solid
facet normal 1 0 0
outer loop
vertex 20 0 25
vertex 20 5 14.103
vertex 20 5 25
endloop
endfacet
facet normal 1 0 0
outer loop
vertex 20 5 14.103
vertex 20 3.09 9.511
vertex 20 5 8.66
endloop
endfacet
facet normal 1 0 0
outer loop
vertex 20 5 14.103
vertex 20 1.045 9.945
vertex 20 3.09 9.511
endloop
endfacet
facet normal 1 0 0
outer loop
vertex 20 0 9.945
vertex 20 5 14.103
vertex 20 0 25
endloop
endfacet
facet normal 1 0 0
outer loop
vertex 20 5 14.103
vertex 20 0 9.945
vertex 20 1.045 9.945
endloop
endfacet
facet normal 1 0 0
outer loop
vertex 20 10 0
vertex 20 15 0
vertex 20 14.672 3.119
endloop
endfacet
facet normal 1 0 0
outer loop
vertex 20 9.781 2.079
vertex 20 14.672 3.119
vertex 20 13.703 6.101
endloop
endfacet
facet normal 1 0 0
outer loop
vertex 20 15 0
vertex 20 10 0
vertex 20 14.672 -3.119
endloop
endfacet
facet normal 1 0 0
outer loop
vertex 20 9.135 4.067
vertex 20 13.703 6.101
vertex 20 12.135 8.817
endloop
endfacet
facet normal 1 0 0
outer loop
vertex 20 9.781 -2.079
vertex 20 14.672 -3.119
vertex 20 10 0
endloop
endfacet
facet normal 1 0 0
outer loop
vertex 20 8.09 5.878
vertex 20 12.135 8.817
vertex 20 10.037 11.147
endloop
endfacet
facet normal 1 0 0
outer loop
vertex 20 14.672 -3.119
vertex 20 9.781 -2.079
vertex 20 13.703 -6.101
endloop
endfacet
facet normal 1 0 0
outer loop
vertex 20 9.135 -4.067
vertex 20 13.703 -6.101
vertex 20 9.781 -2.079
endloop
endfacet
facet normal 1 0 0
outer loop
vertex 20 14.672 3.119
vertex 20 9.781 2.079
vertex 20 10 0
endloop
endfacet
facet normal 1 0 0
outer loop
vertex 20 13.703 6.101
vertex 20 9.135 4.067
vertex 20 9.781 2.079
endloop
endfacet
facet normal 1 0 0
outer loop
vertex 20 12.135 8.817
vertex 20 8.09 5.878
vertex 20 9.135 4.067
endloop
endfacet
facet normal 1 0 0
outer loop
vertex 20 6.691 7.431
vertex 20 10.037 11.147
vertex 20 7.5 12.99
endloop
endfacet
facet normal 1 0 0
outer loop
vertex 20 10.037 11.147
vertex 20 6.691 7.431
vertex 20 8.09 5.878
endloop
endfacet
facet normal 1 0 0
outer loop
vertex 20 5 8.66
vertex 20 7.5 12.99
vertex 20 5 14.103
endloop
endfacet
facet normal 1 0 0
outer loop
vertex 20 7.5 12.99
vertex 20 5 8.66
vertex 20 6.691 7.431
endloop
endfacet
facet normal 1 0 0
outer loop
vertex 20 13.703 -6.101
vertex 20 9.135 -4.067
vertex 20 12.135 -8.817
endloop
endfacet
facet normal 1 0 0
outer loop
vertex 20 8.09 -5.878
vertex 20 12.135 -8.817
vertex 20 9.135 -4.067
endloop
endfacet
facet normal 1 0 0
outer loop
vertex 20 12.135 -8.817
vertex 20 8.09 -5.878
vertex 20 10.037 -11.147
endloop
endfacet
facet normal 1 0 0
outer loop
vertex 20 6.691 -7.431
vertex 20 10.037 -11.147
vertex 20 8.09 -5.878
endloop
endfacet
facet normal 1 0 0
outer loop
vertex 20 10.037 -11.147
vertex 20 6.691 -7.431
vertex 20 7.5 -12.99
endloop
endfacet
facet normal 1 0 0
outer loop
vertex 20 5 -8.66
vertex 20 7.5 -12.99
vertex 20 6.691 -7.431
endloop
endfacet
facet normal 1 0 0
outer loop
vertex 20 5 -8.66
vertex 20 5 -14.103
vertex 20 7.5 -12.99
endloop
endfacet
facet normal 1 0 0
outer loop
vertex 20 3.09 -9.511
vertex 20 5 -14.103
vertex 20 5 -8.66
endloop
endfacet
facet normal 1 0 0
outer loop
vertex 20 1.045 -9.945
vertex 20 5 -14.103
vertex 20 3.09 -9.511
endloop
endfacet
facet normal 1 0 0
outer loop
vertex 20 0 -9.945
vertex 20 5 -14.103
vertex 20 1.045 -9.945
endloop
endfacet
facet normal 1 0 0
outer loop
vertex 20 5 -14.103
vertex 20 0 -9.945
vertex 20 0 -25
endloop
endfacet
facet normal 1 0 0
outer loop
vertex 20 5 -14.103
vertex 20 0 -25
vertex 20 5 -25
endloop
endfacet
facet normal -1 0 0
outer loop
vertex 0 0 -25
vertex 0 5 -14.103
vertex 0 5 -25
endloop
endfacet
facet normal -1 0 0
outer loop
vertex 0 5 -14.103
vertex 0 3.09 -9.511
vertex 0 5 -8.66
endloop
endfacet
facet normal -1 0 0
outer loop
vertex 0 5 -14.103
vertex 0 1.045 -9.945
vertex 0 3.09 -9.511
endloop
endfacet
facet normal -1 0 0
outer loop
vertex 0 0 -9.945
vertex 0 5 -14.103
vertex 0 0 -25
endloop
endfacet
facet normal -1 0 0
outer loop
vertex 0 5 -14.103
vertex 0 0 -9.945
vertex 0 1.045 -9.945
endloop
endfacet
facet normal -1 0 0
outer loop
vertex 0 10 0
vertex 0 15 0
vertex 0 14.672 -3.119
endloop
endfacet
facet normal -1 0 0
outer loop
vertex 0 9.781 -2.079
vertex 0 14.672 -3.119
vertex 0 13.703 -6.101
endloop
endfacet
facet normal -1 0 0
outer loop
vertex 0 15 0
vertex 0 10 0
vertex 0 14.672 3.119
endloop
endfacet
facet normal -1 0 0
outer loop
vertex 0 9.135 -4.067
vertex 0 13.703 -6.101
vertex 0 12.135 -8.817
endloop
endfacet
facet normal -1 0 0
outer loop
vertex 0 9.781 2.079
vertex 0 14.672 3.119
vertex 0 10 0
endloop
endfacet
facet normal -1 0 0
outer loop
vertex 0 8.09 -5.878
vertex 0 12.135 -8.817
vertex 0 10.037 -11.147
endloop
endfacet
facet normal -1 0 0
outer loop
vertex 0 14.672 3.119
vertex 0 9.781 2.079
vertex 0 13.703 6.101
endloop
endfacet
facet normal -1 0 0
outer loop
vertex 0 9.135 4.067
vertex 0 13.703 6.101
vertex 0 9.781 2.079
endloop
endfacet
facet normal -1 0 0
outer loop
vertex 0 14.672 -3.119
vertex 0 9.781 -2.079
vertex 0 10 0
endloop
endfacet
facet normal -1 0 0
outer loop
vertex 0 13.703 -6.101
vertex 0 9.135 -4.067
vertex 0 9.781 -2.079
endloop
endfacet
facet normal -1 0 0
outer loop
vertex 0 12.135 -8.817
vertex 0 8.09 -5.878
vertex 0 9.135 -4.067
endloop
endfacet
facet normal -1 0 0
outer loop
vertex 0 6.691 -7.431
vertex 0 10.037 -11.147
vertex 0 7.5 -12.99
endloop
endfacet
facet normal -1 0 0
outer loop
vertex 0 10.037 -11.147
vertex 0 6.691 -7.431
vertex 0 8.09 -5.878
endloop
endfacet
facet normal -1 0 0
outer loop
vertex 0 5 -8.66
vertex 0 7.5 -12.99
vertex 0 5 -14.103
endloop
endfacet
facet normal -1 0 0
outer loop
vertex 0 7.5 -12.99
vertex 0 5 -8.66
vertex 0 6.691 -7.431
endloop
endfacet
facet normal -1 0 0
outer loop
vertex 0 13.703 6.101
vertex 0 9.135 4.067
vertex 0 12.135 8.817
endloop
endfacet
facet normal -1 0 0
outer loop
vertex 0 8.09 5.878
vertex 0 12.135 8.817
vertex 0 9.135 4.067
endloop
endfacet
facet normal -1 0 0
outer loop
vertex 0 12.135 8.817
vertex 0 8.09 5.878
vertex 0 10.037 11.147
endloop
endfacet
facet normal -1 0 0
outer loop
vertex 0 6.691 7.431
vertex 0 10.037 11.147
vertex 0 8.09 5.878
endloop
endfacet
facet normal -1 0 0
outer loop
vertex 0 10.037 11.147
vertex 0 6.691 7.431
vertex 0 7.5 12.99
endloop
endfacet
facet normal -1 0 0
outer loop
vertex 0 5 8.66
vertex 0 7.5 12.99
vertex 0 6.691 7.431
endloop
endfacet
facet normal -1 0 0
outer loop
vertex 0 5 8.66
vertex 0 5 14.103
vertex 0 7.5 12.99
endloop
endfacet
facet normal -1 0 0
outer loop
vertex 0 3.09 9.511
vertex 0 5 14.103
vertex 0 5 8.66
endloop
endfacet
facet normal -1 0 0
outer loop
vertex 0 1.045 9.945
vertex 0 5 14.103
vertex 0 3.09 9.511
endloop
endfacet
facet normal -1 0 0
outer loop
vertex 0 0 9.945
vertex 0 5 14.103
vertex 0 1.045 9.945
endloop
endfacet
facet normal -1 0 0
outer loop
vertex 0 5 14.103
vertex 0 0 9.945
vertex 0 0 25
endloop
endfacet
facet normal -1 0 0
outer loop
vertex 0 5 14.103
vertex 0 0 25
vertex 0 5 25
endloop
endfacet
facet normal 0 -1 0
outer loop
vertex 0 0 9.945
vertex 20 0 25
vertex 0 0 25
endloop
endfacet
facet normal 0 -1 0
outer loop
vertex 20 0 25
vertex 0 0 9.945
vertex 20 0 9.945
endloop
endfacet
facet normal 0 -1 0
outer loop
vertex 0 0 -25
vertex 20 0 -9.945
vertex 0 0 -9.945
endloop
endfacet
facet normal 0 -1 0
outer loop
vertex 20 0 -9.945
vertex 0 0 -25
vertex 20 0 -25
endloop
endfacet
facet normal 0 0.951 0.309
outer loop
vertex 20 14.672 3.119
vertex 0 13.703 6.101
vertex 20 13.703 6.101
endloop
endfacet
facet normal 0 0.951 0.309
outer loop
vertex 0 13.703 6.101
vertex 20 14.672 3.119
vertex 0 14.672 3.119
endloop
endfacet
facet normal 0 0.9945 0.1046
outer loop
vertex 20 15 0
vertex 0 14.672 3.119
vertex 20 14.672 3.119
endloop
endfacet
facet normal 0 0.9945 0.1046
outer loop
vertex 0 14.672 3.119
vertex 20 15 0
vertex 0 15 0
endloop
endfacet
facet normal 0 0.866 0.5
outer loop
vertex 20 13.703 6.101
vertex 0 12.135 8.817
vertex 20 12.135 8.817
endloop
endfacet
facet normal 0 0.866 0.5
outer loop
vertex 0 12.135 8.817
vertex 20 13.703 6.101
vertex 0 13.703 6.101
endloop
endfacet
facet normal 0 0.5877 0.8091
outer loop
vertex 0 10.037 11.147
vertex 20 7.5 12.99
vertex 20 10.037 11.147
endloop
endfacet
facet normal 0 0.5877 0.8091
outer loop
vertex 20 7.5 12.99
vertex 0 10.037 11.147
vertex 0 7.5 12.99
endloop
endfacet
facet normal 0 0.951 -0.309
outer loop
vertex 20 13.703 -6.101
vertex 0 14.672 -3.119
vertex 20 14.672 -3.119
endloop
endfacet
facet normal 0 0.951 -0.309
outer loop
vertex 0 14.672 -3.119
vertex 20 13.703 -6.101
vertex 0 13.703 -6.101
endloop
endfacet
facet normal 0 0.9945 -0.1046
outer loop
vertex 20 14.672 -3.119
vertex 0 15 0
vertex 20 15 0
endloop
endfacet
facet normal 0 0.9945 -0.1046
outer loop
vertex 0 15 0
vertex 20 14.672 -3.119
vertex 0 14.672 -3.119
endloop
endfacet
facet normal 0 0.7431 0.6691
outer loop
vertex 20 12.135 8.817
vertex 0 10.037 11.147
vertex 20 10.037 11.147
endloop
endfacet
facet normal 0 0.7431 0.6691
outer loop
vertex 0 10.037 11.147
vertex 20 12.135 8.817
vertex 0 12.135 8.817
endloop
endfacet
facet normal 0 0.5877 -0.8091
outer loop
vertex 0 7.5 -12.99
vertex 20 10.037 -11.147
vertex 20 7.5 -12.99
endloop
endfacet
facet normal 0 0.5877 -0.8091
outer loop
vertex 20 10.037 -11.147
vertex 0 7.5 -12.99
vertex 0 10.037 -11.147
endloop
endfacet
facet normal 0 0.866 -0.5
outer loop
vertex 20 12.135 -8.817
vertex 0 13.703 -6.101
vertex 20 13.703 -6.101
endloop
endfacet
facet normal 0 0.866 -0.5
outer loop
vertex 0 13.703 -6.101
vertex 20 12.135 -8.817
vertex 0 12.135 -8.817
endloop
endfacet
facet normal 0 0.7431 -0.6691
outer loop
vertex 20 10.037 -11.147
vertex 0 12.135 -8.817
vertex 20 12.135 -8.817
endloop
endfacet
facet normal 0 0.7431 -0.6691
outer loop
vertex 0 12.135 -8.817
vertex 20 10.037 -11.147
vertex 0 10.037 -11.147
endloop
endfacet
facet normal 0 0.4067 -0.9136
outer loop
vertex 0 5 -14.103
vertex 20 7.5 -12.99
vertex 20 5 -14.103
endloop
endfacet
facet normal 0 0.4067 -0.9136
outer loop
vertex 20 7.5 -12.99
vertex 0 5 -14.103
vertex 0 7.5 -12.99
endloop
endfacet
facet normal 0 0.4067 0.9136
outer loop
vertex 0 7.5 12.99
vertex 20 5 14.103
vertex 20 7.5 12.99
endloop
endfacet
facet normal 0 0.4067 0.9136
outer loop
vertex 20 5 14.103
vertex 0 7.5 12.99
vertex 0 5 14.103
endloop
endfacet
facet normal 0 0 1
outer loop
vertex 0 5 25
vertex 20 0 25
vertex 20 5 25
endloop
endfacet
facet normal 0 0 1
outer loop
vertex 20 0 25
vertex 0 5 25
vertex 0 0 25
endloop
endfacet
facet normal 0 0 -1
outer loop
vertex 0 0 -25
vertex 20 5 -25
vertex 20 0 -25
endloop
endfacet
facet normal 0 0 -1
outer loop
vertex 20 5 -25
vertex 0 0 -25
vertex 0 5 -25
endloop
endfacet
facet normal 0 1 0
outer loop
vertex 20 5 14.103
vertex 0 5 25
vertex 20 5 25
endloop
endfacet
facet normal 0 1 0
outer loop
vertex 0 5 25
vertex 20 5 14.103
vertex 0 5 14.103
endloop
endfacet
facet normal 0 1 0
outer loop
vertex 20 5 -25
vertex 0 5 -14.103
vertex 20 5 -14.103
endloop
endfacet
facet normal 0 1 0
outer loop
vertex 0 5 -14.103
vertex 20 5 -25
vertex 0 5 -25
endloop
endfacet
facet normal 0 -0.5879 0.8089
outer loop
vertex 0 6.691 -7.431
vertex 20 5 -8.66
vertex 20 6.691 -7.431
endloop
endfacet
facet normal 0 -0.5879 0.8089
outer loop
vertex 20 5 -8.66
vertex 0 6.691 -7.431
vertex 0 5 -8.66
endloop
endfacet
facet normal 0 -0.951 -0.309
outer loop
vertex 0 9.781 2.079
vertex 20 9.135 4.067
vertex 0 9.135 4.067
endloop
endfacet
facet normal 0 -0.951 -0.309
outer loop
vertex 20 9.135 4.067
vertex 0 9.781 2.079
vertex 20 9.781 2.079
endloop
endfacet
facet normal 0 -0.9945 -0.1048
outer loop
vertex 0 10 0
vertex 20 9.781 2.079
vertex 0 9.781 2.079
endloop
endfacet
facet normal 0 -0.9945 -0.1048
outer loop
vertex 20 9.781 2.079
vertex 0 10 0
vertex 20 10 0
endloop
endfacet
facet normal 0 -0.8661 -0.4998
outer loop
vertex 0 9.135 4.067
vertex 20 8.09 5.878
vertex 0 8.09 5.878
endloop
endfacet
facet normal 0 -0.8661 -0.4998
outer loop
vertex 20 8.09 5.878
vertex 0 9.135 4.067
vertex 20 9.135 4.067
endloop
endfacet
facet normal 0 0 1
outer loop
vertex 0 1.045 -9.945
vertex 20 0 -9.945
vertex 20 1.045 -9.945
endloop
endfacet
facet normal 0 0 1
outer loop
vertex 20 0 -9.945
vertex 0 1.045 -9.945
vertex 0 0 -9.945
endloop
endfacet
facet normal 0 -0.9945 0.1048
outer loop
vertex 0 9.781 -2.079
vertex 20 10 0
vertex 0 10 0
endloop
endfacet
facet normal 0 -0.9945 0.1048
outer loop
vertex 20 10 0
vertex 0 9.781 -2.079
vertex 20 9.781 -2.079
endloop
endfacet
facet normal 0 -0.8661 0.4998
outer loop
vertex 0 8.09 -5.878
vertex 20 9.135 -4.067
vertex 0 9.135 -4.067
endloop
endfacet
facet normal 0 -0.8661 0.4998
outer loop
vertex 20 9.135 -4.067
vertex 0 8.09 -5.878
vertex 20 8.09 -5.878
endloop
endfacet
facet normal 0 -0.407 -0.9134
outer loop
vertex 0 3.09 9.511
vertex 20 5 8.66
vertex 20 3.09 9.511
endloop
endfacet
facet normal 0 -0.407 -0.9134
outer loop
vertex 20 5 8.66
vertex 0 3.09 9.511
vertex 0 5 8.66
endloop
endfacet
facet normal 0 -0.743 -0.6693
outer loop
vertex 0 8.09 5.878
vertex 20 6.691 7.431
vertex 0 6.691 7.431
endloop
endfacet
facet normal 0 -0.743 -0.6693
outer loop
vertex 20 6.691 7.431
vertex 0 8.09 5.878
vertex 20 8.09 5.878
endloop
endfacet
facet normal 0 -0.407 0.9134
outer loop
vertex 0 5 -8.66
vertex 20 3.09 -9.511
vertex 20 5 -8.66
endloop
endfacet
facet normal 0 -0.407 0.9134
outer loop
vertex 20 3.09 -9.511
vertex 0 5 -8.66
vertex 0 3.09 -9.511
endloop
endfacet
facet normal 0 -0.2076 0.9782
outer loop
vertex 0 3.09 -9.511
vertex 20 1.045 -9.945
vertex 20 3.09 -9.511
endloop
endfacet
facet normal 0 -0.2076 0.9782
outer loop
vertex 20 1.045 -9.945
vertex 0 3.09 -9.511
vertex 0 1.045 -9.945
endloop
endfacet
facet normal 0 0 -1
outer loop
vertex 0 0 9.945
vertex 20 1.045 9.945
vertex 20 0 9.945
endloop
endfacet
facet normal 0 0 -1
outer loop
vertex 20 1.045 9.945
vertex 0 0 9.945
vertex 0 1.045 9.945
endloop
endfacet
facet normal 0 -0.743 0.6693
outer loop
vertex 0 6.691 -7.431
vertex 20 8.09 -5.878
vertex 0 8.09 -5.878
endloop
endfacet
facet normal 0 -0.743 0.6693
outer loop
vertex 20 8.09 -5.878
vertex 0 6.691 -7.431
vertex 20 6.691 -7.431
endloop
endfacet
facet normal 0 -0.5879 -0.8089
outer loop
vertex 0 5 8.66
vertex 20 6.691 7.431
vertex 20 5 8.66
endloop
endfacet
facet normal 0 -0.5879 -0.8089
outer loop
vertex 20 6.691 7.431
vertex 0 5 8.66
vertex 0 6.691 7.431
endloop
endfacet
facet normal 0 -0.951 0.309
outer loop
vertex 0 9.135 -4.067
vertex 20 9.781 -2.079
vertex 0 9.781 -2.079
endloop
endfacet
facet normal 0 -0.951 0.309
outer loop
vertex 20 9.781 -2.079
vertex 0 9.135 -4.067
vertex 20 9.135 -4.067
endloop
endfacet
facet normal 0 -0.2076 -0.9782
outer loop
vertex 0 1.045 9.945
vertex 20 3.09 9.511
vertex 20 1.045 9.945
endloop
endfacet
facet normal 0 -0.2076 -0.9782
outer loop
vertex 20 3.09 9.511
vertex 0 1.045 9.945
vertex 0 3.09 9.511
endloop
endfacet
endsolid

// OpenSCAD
width=20;
depth=5;
bar_r=10;
length=50;

difference () { 
union () {
  translate ([0, 0, -( length / 2 ) ] ) {cube ( [width,depth, length] );}
  intersection () {
    translate ([0, 0, - (bar_r + depth) ] ) {
      cube ( [width, bar_r + depth, (bar_r + depth) * 2] );
    }
    rotate( a=[90, 0, 90]) { cylinder( h=width, r1=bar_r + depth, r2=bar_r + depth);}
  }
}
rotate(a=[90, 0, 90]) { cylinder( h=width, r1=bar_r, r2=bar_r); }
}
